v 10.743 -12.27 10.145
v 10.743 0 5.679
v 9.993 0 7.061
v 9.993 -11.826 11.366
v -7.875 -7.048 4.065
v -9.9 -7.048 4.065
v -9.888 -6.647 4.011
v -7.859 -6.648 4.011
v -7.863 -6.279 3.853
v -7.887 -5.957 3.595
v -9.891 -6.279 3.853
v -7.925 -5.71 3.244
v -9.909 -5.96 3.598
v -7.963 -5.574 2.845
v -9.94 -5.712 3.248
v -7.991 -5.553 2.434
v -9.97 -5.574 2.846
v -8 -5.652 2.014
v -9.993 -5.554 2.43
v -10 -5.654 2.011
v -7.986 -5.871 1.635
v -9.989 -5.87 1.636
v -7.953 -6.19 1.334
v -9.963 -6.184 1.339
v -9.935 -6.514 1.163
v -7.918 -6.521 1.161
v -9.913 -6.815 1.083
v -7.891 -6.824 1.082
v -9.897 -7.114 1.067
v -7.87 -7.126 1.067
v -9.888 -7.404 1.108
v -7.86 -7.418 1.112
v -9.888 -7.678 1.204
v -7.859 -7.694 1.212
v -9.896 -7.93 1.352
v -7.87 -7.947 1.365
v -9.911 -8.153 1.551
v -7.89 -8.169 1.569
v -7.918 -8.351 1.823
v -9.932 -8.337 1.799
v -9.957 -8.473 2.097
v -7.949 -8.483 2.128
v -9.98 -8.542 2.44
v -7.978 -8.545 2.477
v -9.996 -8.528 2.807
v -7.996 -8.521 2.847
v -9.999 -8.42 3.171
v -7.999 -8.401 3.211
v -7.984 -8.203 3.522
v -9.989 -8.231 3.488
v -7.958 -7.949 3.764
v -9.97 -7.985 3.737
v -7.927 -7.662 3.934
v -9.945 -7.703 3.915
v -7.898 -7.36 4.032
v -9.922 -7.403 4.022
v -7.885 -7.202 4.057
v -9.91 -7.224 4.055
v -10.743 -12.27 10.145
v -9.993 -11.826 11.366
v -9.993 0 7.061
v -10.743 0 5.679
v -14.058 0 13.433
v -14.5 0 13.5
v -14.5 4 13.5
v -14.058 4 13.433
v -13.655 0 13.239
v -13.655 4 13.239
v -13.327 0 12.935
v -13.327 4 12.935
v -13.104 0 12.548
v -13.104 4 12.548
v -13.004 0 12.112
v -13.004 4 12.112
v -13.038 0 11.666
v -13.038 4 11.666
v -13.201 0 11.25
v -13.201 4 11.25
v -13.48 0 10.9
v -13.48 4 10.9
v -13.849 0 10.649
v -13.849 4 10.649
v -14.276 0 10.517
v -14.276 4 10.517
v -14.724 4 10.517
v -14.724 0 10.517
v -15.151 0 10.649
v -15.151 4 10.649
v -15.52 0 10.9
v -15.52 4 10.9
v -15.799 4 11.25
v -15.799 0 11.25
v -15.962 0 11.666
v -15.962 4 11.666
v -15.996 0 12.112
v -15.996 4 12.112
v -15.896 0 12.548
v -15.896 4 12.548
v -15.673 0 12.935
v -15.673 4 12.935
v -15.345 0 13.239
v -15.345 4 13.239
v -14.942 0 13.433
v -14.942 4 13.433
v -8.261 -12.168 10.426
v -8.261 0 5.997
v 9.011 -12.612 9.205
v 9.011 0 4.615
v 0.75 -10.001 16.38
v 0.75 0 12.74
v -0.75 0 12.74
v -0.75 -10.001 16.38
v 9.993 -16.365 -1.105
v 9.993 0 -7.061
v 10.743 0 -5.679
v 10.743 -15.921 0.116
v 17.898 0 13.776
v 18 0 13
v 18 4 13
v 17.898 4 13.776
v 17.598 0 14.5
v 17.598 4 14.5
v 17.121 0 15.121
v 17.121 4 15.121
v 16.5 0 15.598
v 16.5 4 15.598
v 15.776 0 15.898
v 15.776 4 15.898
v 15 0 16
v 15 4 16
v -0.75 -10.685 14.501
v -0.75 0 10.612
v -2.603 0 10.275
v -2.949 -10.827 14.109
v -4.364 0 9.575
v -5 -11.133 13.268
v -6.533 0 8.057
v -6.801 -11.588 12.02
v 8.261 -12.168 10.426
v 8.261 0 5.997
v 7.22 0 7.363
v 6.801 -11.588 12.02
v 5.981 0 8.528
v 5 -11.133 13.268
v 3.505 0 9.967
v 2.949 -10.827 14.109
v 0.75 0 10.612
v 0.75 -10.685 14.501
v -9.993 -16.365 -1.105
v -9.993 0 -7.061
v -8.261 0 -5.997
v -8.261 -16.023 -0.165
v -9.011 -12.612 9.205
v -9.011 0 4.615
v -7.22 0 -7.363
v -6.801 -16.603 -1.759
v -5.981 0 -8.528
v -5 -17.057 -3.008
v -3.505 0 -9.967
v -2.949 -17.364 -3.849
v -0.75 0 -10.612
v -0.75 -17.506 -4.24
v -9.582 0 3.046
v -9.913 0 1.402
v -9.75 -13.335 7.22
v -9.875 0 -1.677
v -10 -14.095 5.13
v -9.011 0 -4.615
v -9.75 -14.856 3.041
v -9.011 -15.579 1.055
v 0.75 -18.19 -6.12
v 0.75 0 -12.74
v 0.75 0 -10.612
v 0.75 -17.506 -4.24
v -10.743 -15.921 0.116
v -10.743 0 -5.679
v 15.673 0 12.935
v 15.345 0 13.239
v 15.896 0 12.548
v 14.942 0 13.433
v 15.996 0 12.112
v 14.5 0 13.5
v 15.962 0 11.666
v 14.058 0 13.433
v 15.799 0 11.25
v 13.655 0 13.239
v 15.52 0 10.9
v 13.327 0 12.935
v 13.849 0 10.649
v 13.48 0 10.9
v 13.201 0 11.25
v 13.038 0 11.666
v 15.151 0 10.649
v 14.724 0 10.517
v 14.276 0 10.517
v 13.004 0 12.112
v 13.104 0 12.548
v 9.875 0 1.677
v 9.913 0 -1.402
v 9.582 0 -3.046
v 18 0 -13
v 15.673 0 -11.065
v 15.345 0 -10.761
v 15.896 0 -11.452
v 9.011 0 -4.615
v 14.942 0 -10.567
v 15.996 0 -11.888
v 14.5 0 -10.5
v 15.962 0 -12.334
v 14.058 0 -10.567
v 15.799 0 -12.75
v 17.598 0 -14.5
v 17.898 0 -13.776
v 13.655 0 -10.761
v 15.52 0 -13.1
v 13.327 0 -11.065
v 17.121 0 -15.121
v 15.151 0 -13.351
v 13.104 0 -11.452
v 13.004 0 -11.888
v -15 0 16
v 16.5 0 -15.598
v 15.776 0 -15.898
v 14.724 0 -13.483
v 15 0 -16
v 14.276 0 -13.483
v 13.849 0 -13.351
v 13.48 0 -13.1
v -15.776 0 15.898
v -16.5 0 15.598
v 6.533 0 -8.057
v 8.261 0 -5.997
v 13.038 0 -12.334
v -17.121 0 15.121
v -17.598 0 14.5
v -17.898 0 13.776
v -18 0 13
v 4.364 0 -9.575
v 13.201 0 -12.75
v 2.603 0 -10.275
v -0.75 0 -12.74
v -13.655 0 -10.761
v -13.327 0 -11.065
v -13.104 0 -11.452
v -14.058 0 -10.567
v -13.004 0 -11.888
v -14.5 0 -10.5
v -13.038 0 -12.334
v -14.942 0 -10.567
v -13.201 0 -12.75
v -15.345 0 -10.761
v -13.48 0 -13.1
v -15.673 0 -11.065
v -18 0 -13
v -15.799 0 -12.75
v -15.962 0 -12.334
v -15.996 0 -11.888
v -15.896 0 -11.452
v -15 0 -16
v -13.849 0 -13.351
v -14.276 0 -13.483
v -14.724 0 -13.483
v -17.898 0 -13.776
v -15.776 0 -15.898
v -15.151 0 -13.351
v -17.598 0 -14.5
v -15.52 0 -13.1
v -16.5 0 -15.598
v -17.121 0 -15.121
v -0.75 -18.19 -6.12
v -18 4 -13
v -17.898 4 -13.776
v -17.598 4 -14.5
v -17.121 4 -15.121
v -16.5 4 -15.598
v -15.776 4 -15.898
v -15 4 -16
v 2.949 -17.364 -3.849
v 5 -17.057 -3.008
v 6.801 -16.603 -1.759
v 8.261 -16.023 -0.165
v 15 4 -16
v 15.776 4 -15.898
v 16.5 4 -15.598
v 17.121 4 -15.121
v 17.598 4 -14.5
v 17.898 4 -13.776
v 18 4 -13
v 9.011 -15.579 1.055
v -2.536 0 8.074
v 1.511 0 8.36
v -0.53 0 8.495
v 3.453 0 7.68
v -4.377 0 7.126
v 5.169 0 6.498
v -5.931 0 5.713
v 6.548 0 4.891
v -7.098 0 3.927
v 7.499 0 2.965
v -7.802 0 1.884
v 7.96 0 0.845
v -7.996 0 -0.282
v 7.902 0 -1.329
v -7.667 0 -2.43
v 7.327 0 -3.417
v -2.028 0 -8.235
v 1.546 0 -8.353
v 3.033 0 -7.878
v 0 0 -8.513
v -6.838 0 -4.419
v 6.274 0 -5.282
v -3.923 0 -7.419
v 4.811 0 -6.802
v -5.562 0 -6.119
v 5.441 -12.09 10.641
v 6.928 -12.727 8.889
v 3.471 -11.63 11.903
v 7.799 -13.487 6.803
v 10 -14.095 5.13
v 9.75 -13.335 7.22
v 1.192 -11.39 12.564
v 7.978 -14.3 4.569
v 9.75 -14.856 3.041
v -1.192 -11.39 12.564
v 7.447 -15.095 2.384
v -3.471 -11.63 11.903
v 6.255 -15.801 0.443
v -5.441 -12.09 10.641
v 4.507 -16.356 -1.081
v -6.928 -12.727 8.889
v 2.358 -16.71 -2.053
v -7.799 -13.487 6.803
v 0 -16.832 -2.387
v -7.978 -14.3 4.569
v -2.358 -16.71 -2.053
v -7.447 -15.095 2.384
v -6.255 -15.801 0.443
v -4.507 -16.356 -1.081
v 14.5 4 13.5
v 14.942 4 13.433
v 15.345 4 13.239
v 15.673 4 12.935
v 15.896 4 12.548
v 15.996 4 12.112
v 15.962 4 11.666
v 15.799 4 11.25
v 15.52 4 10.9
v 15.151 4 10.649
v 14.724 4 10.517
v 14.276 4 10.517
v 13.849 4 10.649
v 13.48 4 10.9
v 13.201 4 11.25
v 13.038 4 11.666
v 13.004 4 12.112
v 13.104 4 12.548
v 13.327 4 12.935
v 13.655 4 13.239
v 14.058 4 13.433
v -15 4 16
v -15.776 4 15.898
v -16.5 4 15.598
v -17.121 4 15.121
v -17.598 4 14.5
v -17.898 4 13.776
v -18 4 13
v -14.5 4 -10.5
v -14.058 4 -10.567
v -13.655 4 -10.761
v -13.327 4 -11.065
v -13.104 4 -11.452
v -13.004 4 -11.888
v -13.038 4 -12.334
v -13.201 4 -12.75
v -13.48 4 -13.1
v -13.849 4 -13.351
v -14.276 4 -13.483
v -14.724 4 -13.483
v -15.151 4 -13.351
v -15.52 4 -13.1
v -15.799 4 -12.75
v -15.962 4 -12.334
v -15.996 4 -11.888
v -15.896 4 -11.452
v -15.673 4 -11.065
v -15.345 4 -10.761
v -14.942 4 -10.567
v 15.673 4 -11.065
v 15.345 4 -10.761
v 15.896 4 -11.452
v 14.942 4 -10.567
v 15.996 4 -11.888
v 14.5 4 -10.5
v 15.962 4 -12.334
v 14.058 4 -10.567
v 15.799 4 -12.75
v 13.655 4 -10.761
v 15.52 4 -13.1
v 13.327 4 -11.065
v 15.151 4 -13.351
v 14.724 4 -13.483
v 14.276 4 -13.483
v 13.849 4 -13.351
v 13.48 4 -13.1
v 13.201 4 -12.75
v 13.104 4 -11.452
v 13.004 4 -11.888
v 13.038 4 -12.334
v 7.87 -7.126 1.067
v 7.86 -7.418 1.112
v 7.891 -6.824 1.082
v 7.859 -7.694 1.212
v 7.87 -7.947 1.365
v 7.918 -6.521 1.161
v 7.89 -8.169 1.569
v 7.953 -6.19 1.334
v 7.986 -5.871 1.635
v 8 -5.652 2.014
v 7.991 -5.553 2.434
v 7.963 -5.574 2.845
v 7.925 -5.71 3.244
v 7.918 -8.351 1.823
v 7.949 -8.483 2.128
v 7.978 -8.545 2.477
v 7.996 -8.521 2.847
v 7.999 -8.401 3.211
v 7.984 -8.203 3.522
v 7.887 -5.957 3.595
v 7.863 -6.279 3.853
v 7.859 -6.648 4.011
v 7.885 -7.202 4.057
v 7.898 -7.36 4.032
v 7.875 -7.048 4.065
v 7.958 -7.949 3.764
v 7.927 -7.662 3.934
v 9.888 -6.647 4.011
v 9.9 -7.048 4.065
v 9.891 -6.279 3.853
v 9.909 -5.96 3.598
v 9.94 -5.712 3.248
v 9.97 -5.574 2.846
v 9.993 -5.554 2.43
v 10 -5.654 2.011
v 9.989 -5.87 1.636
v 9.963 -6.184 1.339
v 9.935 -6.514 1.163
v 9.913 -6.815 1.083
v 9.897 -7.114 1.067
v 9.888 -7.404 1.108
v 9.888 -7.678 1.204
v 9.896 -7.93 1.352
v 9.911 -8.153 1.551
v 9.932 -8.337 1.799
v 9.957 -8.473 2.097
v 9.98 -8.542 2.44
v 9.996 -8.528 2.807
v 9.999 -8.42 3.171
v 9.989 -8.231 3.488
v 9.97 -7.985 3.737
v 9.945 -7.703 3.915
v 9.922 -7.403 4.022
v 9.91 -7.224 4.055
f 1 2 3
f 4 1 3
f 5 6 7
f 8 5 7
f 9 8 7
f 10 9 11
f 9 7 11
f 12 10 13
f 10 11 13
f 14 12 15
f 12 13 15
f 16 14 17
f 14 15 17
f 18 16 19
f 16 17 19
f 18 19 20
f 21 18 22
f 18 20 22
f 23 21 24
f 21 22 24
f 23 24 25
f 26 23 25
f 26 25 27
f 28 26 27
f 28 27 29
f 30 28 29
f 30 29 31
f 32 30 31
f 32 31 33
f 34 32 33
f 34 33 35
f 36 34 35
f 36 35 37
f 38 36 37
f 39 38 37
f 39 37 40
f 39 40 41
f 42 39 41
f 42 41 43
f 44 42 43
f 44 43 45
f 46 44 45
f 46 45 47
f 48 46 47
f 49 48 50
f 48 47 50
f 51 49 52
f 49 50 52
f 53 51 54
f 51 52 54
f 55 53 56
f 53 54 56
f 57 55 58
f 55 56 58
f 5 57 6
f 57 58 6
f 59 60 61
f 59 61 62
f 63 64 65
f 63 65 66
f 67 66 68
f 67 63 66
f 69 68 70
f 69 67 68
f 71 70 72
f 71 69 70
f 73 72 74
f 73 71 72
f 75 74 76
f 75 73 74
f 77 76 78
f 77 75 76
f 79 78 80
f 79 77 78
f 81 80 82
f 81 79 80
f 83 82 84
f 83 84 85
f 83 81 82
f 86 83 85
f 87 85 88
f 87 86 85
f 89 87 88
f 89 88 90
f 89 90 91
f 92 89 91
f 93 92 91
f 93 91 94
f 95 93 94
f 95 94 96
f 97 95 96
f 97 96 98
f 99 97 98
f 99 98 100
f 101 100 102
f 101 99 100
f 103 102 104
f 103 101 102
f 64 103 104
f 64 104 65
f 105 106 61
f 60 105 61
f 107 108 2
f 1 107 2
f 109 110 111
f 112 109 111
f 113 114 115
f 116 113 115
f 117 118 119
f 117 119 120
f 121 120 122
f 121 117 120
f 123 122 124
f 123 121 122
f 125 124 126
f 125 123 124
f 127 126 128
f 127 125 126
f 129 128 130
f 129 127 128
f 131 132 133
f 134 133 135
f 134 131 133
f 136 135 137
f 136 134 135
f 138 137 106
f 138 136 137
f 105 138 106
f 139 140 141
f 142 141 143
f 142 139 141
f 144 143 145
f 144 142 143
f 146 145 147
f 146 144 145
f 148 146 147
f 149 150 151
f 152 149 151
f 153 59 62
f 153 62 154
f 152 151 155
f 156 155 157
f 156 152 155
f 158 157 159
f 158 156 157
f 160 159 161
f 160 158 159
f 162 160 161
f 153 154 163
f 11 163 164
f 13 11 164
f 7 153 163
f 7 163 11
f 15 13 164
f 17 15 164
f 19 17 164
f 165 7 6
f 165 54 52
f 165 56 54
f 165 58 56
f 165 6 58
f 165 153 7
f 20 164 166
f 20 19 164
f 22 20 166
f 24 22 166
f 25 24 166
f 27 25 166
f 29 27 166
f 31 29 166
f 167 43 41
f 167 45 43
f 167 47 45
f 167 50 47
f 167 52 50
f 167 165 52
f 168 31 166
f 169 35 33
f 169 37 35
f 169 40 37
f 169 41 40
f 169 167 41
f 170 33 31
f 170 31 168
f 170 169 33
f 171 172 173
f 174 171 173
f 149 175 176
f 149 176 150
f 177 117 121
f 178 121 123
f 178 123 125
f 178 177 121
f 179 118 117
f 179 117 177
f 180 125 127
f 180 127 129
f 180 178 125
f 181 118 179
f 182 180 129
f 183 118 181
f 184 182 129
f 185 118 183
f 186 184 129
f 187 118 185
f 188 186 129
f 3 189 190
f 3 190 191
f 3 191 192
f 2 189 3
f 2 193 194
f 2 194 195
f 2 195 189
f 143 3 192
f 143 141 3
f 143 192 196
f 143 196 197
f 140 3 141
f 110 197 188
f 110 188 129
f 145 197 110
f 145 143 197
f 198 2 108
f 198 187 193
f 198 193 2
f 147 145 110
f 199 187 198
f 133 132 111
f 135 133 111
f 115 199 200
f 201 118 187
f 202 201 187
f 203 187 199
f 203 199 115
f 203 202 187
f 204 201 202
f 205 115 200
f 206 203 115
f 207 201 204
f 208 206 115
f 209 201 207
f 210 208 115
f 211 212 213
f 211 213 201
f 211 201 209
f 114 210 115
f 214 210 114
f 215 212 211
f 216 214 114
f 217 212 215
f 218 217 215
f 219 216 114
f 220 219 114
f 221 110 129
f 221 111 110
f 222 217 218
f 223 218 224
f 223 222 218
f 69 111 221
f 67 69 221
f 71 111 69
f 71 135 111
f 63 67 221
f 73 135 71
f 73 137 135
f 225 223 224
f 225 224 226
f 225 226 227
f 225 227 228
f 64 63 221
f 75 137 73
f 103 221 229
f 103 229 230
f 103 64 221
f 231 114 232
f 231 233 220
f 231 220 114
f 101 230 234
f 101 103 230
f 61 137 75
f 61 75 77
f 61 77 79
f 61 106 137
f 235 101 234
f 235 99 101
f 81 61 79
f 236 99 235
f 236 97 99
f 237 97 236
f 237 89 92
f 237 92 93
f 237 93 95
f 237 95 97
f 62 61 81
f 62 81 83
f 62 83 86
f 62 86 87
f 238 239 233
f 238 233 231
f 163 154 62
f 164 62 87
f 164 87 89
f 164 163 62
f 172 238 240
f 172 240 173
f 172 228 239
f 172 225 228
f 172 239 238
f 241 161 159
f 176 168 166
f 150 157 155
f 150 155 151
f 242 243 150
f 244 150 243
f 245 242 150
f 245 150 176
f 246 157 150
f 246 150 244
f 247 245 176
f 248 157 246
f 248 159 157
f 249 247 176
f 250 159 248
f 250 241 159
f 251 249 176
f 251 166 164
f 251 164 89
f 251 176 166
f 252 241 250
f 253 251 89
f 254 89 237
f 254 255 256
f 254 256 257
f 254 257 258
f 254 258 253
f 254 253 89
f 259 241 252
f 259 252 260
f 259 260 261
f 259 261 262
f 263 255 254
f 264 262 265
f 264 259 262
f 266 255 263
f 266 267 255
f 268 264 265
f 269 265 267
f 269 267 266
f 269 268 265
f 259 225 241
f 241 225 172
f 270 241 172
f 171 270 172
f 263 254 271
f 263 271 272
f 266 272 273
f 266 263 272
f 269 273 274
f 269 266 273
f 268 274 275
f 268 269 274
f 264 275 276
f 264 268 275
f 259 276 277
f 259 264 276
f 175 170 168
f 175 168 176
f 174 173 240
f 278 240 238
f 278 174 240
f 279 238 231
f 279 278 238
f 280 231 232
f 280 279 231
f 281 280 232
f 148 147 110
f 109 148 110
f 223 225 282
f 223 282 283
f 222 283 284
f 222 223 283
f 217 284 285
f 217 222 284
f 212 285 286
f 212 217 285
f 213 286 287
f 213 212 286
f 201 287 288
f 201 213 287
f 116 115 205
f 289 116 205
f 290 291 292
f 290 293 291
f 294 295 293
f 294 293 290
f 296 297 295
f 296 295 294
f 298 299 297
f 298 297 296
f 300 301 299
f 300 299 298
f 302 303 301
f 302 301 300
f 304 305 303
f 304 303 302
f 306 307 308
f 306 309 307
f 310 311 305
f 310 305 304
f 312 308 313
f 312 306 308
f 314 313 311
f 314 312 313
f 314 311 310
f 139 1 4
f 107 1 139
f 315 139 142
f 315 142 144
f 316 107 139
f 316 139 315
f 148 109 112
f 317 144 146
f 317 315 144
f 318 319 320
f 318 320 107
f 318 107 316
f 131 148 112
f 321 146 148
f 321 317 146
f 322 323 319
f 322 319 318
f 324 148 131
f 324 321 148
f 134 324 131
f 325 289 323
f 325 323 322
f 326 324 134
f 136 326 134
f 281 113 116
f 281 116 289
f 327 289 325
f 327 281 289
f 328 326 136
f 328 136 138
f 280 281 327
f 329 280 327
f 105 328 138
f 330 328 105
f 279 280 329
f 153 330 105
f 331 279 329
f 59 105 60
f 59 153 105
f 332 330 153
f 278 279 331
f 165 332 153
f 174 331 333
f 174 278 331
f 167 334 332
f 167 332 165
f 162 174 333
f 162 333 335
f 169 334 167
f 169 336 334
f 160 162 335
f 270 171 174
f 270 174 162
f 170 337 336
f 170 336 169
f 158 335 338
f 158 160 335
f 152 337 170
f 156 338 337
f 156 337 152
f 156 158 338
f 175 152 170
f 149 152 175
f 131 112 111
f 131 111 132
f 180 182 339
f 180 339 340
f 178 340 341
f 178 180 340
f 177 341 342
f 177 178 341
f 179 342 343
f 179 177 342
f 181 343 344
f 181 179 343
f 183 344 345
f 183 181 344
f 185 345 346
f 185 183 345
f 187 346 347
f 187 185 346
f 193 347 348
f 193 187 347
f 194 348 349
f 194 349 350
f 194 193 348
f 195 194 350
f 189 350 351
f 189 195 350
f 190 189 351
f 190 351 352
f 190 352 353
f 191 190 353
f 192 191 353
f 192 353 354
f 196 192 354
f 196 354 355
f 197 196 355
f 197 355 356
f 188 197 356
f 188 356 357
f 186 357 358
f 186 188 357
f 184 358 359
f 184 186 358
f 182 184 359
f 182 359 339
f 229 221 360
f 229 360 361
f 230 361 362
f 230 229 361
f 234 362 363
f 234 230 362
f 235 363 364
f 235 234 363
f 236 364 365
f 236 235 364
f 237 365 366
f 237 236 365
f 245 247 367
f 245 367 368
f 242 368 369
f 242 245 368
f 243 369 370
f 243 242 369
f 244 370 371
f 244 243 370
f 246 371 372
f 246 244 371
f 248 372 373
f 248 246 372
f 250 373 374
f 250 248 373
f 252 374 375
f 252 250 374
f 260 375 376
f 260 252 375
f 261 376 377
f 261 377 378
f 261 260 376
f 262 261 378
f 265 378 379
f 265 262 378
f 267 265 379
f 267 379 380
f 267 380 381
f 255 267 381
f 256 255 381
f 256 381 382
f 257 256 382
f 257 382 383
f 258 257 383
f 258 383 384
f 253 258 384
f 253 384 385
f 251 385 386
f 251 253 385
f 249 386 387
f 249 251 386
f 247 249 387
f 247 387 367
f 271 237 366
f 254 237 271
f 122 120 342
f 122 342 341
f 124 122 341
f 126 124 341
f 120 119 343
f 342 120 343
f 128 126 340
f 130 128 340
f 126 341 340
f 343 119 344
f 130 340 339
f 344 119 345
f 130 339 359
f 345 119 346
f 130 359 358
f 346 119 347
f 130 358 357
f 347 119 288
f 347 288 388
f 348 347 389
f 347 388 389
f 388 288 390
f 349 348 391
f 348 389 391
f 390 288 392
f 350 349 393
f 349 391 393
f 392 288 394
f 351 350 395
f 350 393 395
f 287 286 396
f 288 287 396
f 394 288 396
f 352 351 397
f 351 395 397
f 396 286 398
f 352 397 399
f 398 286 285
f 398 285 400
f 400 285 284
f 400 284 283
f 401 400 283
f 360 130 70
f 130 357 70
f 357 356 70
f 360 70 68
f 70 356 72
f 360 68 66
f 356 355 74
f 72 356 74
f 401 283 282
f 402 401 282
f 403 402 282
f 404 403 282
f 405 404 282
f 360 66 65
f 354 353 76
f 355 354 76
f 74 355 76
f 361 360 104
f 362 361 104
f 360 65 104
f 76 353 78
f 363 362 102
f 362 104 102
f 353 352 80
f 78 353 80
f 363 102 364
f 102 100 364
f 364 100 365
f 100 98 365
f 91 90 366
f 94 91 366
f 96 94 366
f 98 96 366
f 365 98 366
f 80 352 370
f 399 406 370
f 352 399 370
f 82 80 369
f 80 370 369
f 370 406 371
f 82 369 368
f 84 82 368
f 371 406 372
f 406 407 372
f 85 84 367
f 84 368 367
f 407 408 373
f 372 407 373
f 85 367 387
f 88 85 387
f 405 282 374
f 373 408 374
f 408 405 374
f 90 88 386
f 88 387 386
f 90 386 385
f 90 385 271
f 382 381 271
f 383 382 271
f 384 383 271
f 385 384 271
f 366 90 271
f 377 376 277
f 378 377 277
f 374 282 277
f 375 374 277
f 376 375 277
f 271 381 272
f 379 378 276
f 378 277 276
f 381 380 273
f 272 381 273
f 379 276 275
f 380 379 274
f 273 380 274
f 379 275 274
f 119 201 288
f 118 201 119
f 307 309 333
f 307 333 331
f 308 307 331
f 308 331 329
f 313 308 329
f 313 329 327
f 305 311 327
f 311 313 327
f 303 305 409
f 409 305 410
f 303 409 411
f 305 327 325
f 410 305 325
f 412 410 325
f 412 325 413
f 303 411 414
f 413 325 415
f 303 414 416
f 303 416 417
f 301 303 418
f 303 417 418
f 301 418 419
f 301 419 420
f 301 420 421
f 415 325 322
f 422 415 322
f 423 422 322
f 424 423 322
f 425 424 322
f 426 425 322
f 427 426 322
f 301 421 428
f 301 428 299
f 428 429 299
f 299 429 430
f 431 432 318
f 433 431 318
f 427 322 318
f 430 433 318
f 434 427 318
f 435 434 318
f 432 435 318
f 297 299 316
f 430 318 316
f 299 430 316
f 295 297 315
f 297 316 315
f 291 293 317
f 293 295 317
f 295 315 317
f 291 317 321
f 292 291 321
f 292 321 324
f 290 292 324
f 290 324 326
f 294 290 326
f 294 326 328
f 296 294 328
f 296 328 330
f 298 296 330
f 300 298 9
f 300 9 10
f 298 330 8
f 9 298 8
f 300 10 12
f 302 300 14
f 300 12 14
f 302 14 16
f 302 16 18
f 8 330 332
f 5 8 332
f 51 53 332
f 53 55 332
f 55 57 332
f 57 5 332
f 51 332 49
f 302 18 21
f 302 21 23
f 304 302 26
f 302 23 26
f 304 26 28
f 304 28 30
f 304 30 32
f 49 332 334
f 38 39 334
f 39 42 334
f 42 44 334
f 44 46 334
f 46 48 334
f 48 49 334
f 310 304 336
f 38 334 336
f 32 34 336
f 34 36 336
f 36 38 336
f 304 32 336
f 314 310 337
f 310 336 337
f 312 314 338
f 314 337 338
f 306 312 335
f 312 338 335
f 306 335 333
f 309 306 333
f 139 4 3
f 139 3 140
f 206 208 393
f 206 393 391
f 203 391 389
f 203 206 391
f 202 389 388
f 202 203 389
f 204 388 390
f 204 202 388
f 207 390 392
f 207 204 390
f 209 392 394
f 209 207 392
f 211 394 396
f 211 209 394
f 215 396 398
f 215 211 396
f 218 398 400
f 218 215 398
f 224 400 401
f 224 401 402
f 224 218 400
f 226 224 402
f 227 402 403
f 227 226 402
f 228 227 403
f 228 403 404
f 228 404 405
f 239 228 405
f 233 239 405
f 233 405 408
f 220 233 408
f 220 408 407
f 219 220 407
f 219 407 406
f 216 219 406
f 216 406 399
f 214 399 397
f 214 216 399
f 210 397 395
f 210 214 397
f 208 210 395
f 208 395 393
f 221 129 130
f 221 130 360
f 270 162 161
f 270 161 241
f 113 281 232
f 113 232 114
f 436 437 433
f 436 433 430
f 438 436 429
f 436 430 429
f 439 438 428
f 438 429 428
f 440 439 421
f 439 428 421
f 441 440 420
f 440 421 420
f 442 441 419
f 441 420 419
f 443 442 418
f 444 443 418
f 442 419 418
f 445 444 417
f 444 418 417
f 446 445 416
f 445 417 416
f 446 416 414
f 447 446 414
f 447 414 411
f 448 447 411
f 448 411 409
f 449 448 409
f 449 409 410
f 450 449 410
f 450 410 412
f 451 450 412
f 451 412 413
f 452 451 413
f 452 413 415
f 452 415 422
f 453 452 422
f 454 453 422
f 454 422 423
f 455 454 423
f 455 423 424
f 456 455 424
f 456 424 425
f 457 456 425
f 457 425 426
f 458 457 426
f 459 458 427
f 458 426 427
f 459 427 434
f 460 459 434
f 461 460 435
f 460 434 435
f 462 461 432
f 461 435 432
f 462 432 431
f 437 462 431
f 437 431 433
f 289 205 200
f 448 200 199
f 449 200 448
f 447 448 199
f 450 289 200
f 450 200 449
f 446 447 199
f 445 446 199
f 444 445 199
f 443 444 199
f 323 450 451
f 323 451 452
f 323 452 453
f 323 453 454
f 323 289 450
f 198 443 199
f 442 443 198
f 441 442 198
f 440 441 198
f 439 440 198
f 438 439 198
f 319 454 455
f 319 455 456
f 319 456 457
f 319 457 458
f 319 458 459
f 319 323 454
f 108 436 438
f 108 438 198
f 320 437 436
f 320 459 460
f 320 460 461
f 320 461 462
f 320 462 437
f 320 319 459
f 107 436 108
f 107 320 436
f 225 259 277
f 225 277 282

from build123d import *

# Parameters (mm, degrees)
IZIM2_R                     = 1.5
Y_KSEKLIK_EKSTR_ZYON1_DEPTH = 4
Y_KSEKLIK_EKSTR_ZYON2_REACH = 35.135
IZIM4_R                     = 8
KES_EKSTR_ZYON1_REACH       = 45.534
IZIM5_R                     = 1.5


with BuildPart() as part:
    # Çizim2 → Yükseklik-Ekstrüzyon1 (new body)
    with BuildSketch(Plane(origin=(0, 0, 0), x_dir=(1, 0, 0), z_dir=(0, 1, 0))):
        with BuildLine():
            Line((15, -16), (-15, -16))
            ThreePointArc((-15, -16), (-17.121320344, -15.121320344), (-18, -13))
            Line((-18, -13), (-18, 13))
            ThreePointArc((-18, 13), (-17.121320344, 15.121320344), (-15, 16))
            Line((-15, 16), (15, 16))
            ThreePointArc((15, 16), (17.121320344, 15.121320344), (18, 13))
            Line((18, 13), (18, -13))
            ThreePointArc((18, -13), (17.121320344, -15.121320344), (15, -16))
        make_face()
        with Locations(Location((14.5, -12, 0), (0, 0, 270))):
            Circle(IZIM2_R, mode=Mode.SUBTRACT)
        with Locations(Location((-14.5, -12, 0), (0, 0, 270))):
            Circle(IZIM2_R, mode=Mode.SUBTRACT)
        with Locations(Location((14.5, 12, 0), (0, 0, 270))):
            Circle(IZIM2_R, mode=Mode.SUBTRACT)
        with Locations(Location((-14.5, 12, 0), (0, 0, 270))):
            Circle(IZIM2_R, mode=Mode.SUBTRACT)
    extrude(amount=Y_KSEKLIK_EKSTR_ZYON1_DEPTH)

    # Yükseklik-Ekstrüzyon2: up to this plane
    y_kseklik_ekstr_zyon2_end = Plane(origin=(15, 0, -13), z_dir=(0, 1, 0))
    # Çizim4 → Yükseklik-Ekstrüzyon2 (add, up to the surface)
    with BuildSketch(Plane(origin=(0, -14.095389312, 5.13030215), x_dir=(-1, 0, 0), z_dir=(0, -0.9396926207859094, 0.34202014332566627)), mode=Mode.PRIVATE) as y_kseklik_ekstr_zyon2_sk1:
        with BuildLine():
            Line((-0.75, 11.971835338), (-0.75, 9.971835338))
            ThreePointArc((-0.75, 9.971835338), (-5, 8.660254038), (-8.260862725, 5.635436722))
            Line((-8.260862725, 5.635436722), (-9.992913532, 6.635436722))
            Line((-9.992913532, 6.635436722), (-10.742913532, 5.336398616))
            Line((-10.742913532, 5.336398616), (-9.010862725, 4.336398616))
            ThreePointArc((-9.010862725, 4.336398616), (-10, 0), (-9.010862725, -4.336398616))
            Line((-9.010862725, -4.336398616), (-10.742913532, -5.336398616))
            Line((-10.742913532, -5.336398616), (-9.992913532, -6.635436722))
            Line((-9.992913532, -6.635436722), (-8.260862725, -5.635436722))
            ThreePointArc((-8.260862725, -5.635436722), (-5, -8.660254038), (-0.75, -9.971835338))
            Line((-0.75, -9.971835338), (-0.75, -11.971835338))
            Line((-0.75, -11.971835338), (0.75, -11.971835338))
            Line((0.75, -11.971835338), (0.75, -9.971835338))
            ThreePointArc((0.75, -9.971835338), (5, -8.660254038), (8.260862725, -5.635436722))
            Line((8.260862725, -5.635436722), (9.992913532, -6.635436722))
            Line((9.992913532, -6.635436722), (10.742913532, -5.336398616))
            Line((10.742913532, -5.336398616), (9.010862725, -4.336398616))
            ThreePointArc((9.010862725, -4.336398616), (10, 0), (9.010862725, 4.336398616))
            Line((9.010862725, 4.336398616), (10.742913532, 5.336398616))
            Line((10.742913532, 5.336398616), (9.992913532, 6.635436722))
            Line((9.992913532, 6.635436722), (8.260862725, 5.635436722))
            ThreePointArc((8.260862725, 5.635436722), (5, 8.660254038), (0.75, 9.971835338))
            Line((0.75, 9.971835338), (0.75, 11.971835338))
            Line((0.75, 11.971835338), (-0.75, 11.971835338))
        make_face()
        with Locations(Location((0, 0, 0), (0, 0, 90))):
            Circle(IZIM4_R, mode=Mode.SUBTRACT)
    y_kseklik_ekstr_zyon2_tool1 = split(extrude(y_kseklik_ekstr_zyon2_sk1.sketch, amount=-Y_KSEKLIK_EKSTR_ZYON2_REACH, mode=Mode.PRIVATE), bisect_by=y_kseklik_ekstr_zyon2_end, keep=Keep.BOTH, mode=Mode.PRIVATE)
    add(y_kseklik_ekstr_zyon2_tool1.solids().sort_by_distance((-0.428295, -17.847978, -5.179851))[0])

    # Çizim5 → Kes-Ekstrüzyon1 (cut, up to next)
    with BuildSketch(Plane.ZY.offset(18), mode=Mode.PRIVATE) as kes_ekstr_zyon1_sk1:
        with Locations((2.565151075, -7.047694656)):
            Circle(IZIM5_R)
    kes_ekstr_zyon1_tool1 = extrude(kes_ekstr_zyon1_sk1.sketch, amount=-KES_EKSTR_ZYON1_REACH, mode=Mode.PRIVATE) & part.part
    add(kes_ekstr_zyon1_tool1.solids().sort_by_distance((-18, -7.047695, 2.565151))[0], mode=Mode.SUBTRACT)
    add(kes_ekstr_zyon1_tool1.solids().sort_by_distance((-18, -7.047695, 2.565151))[1], mode=Mode.SUBTRACT)


solid = part.part
